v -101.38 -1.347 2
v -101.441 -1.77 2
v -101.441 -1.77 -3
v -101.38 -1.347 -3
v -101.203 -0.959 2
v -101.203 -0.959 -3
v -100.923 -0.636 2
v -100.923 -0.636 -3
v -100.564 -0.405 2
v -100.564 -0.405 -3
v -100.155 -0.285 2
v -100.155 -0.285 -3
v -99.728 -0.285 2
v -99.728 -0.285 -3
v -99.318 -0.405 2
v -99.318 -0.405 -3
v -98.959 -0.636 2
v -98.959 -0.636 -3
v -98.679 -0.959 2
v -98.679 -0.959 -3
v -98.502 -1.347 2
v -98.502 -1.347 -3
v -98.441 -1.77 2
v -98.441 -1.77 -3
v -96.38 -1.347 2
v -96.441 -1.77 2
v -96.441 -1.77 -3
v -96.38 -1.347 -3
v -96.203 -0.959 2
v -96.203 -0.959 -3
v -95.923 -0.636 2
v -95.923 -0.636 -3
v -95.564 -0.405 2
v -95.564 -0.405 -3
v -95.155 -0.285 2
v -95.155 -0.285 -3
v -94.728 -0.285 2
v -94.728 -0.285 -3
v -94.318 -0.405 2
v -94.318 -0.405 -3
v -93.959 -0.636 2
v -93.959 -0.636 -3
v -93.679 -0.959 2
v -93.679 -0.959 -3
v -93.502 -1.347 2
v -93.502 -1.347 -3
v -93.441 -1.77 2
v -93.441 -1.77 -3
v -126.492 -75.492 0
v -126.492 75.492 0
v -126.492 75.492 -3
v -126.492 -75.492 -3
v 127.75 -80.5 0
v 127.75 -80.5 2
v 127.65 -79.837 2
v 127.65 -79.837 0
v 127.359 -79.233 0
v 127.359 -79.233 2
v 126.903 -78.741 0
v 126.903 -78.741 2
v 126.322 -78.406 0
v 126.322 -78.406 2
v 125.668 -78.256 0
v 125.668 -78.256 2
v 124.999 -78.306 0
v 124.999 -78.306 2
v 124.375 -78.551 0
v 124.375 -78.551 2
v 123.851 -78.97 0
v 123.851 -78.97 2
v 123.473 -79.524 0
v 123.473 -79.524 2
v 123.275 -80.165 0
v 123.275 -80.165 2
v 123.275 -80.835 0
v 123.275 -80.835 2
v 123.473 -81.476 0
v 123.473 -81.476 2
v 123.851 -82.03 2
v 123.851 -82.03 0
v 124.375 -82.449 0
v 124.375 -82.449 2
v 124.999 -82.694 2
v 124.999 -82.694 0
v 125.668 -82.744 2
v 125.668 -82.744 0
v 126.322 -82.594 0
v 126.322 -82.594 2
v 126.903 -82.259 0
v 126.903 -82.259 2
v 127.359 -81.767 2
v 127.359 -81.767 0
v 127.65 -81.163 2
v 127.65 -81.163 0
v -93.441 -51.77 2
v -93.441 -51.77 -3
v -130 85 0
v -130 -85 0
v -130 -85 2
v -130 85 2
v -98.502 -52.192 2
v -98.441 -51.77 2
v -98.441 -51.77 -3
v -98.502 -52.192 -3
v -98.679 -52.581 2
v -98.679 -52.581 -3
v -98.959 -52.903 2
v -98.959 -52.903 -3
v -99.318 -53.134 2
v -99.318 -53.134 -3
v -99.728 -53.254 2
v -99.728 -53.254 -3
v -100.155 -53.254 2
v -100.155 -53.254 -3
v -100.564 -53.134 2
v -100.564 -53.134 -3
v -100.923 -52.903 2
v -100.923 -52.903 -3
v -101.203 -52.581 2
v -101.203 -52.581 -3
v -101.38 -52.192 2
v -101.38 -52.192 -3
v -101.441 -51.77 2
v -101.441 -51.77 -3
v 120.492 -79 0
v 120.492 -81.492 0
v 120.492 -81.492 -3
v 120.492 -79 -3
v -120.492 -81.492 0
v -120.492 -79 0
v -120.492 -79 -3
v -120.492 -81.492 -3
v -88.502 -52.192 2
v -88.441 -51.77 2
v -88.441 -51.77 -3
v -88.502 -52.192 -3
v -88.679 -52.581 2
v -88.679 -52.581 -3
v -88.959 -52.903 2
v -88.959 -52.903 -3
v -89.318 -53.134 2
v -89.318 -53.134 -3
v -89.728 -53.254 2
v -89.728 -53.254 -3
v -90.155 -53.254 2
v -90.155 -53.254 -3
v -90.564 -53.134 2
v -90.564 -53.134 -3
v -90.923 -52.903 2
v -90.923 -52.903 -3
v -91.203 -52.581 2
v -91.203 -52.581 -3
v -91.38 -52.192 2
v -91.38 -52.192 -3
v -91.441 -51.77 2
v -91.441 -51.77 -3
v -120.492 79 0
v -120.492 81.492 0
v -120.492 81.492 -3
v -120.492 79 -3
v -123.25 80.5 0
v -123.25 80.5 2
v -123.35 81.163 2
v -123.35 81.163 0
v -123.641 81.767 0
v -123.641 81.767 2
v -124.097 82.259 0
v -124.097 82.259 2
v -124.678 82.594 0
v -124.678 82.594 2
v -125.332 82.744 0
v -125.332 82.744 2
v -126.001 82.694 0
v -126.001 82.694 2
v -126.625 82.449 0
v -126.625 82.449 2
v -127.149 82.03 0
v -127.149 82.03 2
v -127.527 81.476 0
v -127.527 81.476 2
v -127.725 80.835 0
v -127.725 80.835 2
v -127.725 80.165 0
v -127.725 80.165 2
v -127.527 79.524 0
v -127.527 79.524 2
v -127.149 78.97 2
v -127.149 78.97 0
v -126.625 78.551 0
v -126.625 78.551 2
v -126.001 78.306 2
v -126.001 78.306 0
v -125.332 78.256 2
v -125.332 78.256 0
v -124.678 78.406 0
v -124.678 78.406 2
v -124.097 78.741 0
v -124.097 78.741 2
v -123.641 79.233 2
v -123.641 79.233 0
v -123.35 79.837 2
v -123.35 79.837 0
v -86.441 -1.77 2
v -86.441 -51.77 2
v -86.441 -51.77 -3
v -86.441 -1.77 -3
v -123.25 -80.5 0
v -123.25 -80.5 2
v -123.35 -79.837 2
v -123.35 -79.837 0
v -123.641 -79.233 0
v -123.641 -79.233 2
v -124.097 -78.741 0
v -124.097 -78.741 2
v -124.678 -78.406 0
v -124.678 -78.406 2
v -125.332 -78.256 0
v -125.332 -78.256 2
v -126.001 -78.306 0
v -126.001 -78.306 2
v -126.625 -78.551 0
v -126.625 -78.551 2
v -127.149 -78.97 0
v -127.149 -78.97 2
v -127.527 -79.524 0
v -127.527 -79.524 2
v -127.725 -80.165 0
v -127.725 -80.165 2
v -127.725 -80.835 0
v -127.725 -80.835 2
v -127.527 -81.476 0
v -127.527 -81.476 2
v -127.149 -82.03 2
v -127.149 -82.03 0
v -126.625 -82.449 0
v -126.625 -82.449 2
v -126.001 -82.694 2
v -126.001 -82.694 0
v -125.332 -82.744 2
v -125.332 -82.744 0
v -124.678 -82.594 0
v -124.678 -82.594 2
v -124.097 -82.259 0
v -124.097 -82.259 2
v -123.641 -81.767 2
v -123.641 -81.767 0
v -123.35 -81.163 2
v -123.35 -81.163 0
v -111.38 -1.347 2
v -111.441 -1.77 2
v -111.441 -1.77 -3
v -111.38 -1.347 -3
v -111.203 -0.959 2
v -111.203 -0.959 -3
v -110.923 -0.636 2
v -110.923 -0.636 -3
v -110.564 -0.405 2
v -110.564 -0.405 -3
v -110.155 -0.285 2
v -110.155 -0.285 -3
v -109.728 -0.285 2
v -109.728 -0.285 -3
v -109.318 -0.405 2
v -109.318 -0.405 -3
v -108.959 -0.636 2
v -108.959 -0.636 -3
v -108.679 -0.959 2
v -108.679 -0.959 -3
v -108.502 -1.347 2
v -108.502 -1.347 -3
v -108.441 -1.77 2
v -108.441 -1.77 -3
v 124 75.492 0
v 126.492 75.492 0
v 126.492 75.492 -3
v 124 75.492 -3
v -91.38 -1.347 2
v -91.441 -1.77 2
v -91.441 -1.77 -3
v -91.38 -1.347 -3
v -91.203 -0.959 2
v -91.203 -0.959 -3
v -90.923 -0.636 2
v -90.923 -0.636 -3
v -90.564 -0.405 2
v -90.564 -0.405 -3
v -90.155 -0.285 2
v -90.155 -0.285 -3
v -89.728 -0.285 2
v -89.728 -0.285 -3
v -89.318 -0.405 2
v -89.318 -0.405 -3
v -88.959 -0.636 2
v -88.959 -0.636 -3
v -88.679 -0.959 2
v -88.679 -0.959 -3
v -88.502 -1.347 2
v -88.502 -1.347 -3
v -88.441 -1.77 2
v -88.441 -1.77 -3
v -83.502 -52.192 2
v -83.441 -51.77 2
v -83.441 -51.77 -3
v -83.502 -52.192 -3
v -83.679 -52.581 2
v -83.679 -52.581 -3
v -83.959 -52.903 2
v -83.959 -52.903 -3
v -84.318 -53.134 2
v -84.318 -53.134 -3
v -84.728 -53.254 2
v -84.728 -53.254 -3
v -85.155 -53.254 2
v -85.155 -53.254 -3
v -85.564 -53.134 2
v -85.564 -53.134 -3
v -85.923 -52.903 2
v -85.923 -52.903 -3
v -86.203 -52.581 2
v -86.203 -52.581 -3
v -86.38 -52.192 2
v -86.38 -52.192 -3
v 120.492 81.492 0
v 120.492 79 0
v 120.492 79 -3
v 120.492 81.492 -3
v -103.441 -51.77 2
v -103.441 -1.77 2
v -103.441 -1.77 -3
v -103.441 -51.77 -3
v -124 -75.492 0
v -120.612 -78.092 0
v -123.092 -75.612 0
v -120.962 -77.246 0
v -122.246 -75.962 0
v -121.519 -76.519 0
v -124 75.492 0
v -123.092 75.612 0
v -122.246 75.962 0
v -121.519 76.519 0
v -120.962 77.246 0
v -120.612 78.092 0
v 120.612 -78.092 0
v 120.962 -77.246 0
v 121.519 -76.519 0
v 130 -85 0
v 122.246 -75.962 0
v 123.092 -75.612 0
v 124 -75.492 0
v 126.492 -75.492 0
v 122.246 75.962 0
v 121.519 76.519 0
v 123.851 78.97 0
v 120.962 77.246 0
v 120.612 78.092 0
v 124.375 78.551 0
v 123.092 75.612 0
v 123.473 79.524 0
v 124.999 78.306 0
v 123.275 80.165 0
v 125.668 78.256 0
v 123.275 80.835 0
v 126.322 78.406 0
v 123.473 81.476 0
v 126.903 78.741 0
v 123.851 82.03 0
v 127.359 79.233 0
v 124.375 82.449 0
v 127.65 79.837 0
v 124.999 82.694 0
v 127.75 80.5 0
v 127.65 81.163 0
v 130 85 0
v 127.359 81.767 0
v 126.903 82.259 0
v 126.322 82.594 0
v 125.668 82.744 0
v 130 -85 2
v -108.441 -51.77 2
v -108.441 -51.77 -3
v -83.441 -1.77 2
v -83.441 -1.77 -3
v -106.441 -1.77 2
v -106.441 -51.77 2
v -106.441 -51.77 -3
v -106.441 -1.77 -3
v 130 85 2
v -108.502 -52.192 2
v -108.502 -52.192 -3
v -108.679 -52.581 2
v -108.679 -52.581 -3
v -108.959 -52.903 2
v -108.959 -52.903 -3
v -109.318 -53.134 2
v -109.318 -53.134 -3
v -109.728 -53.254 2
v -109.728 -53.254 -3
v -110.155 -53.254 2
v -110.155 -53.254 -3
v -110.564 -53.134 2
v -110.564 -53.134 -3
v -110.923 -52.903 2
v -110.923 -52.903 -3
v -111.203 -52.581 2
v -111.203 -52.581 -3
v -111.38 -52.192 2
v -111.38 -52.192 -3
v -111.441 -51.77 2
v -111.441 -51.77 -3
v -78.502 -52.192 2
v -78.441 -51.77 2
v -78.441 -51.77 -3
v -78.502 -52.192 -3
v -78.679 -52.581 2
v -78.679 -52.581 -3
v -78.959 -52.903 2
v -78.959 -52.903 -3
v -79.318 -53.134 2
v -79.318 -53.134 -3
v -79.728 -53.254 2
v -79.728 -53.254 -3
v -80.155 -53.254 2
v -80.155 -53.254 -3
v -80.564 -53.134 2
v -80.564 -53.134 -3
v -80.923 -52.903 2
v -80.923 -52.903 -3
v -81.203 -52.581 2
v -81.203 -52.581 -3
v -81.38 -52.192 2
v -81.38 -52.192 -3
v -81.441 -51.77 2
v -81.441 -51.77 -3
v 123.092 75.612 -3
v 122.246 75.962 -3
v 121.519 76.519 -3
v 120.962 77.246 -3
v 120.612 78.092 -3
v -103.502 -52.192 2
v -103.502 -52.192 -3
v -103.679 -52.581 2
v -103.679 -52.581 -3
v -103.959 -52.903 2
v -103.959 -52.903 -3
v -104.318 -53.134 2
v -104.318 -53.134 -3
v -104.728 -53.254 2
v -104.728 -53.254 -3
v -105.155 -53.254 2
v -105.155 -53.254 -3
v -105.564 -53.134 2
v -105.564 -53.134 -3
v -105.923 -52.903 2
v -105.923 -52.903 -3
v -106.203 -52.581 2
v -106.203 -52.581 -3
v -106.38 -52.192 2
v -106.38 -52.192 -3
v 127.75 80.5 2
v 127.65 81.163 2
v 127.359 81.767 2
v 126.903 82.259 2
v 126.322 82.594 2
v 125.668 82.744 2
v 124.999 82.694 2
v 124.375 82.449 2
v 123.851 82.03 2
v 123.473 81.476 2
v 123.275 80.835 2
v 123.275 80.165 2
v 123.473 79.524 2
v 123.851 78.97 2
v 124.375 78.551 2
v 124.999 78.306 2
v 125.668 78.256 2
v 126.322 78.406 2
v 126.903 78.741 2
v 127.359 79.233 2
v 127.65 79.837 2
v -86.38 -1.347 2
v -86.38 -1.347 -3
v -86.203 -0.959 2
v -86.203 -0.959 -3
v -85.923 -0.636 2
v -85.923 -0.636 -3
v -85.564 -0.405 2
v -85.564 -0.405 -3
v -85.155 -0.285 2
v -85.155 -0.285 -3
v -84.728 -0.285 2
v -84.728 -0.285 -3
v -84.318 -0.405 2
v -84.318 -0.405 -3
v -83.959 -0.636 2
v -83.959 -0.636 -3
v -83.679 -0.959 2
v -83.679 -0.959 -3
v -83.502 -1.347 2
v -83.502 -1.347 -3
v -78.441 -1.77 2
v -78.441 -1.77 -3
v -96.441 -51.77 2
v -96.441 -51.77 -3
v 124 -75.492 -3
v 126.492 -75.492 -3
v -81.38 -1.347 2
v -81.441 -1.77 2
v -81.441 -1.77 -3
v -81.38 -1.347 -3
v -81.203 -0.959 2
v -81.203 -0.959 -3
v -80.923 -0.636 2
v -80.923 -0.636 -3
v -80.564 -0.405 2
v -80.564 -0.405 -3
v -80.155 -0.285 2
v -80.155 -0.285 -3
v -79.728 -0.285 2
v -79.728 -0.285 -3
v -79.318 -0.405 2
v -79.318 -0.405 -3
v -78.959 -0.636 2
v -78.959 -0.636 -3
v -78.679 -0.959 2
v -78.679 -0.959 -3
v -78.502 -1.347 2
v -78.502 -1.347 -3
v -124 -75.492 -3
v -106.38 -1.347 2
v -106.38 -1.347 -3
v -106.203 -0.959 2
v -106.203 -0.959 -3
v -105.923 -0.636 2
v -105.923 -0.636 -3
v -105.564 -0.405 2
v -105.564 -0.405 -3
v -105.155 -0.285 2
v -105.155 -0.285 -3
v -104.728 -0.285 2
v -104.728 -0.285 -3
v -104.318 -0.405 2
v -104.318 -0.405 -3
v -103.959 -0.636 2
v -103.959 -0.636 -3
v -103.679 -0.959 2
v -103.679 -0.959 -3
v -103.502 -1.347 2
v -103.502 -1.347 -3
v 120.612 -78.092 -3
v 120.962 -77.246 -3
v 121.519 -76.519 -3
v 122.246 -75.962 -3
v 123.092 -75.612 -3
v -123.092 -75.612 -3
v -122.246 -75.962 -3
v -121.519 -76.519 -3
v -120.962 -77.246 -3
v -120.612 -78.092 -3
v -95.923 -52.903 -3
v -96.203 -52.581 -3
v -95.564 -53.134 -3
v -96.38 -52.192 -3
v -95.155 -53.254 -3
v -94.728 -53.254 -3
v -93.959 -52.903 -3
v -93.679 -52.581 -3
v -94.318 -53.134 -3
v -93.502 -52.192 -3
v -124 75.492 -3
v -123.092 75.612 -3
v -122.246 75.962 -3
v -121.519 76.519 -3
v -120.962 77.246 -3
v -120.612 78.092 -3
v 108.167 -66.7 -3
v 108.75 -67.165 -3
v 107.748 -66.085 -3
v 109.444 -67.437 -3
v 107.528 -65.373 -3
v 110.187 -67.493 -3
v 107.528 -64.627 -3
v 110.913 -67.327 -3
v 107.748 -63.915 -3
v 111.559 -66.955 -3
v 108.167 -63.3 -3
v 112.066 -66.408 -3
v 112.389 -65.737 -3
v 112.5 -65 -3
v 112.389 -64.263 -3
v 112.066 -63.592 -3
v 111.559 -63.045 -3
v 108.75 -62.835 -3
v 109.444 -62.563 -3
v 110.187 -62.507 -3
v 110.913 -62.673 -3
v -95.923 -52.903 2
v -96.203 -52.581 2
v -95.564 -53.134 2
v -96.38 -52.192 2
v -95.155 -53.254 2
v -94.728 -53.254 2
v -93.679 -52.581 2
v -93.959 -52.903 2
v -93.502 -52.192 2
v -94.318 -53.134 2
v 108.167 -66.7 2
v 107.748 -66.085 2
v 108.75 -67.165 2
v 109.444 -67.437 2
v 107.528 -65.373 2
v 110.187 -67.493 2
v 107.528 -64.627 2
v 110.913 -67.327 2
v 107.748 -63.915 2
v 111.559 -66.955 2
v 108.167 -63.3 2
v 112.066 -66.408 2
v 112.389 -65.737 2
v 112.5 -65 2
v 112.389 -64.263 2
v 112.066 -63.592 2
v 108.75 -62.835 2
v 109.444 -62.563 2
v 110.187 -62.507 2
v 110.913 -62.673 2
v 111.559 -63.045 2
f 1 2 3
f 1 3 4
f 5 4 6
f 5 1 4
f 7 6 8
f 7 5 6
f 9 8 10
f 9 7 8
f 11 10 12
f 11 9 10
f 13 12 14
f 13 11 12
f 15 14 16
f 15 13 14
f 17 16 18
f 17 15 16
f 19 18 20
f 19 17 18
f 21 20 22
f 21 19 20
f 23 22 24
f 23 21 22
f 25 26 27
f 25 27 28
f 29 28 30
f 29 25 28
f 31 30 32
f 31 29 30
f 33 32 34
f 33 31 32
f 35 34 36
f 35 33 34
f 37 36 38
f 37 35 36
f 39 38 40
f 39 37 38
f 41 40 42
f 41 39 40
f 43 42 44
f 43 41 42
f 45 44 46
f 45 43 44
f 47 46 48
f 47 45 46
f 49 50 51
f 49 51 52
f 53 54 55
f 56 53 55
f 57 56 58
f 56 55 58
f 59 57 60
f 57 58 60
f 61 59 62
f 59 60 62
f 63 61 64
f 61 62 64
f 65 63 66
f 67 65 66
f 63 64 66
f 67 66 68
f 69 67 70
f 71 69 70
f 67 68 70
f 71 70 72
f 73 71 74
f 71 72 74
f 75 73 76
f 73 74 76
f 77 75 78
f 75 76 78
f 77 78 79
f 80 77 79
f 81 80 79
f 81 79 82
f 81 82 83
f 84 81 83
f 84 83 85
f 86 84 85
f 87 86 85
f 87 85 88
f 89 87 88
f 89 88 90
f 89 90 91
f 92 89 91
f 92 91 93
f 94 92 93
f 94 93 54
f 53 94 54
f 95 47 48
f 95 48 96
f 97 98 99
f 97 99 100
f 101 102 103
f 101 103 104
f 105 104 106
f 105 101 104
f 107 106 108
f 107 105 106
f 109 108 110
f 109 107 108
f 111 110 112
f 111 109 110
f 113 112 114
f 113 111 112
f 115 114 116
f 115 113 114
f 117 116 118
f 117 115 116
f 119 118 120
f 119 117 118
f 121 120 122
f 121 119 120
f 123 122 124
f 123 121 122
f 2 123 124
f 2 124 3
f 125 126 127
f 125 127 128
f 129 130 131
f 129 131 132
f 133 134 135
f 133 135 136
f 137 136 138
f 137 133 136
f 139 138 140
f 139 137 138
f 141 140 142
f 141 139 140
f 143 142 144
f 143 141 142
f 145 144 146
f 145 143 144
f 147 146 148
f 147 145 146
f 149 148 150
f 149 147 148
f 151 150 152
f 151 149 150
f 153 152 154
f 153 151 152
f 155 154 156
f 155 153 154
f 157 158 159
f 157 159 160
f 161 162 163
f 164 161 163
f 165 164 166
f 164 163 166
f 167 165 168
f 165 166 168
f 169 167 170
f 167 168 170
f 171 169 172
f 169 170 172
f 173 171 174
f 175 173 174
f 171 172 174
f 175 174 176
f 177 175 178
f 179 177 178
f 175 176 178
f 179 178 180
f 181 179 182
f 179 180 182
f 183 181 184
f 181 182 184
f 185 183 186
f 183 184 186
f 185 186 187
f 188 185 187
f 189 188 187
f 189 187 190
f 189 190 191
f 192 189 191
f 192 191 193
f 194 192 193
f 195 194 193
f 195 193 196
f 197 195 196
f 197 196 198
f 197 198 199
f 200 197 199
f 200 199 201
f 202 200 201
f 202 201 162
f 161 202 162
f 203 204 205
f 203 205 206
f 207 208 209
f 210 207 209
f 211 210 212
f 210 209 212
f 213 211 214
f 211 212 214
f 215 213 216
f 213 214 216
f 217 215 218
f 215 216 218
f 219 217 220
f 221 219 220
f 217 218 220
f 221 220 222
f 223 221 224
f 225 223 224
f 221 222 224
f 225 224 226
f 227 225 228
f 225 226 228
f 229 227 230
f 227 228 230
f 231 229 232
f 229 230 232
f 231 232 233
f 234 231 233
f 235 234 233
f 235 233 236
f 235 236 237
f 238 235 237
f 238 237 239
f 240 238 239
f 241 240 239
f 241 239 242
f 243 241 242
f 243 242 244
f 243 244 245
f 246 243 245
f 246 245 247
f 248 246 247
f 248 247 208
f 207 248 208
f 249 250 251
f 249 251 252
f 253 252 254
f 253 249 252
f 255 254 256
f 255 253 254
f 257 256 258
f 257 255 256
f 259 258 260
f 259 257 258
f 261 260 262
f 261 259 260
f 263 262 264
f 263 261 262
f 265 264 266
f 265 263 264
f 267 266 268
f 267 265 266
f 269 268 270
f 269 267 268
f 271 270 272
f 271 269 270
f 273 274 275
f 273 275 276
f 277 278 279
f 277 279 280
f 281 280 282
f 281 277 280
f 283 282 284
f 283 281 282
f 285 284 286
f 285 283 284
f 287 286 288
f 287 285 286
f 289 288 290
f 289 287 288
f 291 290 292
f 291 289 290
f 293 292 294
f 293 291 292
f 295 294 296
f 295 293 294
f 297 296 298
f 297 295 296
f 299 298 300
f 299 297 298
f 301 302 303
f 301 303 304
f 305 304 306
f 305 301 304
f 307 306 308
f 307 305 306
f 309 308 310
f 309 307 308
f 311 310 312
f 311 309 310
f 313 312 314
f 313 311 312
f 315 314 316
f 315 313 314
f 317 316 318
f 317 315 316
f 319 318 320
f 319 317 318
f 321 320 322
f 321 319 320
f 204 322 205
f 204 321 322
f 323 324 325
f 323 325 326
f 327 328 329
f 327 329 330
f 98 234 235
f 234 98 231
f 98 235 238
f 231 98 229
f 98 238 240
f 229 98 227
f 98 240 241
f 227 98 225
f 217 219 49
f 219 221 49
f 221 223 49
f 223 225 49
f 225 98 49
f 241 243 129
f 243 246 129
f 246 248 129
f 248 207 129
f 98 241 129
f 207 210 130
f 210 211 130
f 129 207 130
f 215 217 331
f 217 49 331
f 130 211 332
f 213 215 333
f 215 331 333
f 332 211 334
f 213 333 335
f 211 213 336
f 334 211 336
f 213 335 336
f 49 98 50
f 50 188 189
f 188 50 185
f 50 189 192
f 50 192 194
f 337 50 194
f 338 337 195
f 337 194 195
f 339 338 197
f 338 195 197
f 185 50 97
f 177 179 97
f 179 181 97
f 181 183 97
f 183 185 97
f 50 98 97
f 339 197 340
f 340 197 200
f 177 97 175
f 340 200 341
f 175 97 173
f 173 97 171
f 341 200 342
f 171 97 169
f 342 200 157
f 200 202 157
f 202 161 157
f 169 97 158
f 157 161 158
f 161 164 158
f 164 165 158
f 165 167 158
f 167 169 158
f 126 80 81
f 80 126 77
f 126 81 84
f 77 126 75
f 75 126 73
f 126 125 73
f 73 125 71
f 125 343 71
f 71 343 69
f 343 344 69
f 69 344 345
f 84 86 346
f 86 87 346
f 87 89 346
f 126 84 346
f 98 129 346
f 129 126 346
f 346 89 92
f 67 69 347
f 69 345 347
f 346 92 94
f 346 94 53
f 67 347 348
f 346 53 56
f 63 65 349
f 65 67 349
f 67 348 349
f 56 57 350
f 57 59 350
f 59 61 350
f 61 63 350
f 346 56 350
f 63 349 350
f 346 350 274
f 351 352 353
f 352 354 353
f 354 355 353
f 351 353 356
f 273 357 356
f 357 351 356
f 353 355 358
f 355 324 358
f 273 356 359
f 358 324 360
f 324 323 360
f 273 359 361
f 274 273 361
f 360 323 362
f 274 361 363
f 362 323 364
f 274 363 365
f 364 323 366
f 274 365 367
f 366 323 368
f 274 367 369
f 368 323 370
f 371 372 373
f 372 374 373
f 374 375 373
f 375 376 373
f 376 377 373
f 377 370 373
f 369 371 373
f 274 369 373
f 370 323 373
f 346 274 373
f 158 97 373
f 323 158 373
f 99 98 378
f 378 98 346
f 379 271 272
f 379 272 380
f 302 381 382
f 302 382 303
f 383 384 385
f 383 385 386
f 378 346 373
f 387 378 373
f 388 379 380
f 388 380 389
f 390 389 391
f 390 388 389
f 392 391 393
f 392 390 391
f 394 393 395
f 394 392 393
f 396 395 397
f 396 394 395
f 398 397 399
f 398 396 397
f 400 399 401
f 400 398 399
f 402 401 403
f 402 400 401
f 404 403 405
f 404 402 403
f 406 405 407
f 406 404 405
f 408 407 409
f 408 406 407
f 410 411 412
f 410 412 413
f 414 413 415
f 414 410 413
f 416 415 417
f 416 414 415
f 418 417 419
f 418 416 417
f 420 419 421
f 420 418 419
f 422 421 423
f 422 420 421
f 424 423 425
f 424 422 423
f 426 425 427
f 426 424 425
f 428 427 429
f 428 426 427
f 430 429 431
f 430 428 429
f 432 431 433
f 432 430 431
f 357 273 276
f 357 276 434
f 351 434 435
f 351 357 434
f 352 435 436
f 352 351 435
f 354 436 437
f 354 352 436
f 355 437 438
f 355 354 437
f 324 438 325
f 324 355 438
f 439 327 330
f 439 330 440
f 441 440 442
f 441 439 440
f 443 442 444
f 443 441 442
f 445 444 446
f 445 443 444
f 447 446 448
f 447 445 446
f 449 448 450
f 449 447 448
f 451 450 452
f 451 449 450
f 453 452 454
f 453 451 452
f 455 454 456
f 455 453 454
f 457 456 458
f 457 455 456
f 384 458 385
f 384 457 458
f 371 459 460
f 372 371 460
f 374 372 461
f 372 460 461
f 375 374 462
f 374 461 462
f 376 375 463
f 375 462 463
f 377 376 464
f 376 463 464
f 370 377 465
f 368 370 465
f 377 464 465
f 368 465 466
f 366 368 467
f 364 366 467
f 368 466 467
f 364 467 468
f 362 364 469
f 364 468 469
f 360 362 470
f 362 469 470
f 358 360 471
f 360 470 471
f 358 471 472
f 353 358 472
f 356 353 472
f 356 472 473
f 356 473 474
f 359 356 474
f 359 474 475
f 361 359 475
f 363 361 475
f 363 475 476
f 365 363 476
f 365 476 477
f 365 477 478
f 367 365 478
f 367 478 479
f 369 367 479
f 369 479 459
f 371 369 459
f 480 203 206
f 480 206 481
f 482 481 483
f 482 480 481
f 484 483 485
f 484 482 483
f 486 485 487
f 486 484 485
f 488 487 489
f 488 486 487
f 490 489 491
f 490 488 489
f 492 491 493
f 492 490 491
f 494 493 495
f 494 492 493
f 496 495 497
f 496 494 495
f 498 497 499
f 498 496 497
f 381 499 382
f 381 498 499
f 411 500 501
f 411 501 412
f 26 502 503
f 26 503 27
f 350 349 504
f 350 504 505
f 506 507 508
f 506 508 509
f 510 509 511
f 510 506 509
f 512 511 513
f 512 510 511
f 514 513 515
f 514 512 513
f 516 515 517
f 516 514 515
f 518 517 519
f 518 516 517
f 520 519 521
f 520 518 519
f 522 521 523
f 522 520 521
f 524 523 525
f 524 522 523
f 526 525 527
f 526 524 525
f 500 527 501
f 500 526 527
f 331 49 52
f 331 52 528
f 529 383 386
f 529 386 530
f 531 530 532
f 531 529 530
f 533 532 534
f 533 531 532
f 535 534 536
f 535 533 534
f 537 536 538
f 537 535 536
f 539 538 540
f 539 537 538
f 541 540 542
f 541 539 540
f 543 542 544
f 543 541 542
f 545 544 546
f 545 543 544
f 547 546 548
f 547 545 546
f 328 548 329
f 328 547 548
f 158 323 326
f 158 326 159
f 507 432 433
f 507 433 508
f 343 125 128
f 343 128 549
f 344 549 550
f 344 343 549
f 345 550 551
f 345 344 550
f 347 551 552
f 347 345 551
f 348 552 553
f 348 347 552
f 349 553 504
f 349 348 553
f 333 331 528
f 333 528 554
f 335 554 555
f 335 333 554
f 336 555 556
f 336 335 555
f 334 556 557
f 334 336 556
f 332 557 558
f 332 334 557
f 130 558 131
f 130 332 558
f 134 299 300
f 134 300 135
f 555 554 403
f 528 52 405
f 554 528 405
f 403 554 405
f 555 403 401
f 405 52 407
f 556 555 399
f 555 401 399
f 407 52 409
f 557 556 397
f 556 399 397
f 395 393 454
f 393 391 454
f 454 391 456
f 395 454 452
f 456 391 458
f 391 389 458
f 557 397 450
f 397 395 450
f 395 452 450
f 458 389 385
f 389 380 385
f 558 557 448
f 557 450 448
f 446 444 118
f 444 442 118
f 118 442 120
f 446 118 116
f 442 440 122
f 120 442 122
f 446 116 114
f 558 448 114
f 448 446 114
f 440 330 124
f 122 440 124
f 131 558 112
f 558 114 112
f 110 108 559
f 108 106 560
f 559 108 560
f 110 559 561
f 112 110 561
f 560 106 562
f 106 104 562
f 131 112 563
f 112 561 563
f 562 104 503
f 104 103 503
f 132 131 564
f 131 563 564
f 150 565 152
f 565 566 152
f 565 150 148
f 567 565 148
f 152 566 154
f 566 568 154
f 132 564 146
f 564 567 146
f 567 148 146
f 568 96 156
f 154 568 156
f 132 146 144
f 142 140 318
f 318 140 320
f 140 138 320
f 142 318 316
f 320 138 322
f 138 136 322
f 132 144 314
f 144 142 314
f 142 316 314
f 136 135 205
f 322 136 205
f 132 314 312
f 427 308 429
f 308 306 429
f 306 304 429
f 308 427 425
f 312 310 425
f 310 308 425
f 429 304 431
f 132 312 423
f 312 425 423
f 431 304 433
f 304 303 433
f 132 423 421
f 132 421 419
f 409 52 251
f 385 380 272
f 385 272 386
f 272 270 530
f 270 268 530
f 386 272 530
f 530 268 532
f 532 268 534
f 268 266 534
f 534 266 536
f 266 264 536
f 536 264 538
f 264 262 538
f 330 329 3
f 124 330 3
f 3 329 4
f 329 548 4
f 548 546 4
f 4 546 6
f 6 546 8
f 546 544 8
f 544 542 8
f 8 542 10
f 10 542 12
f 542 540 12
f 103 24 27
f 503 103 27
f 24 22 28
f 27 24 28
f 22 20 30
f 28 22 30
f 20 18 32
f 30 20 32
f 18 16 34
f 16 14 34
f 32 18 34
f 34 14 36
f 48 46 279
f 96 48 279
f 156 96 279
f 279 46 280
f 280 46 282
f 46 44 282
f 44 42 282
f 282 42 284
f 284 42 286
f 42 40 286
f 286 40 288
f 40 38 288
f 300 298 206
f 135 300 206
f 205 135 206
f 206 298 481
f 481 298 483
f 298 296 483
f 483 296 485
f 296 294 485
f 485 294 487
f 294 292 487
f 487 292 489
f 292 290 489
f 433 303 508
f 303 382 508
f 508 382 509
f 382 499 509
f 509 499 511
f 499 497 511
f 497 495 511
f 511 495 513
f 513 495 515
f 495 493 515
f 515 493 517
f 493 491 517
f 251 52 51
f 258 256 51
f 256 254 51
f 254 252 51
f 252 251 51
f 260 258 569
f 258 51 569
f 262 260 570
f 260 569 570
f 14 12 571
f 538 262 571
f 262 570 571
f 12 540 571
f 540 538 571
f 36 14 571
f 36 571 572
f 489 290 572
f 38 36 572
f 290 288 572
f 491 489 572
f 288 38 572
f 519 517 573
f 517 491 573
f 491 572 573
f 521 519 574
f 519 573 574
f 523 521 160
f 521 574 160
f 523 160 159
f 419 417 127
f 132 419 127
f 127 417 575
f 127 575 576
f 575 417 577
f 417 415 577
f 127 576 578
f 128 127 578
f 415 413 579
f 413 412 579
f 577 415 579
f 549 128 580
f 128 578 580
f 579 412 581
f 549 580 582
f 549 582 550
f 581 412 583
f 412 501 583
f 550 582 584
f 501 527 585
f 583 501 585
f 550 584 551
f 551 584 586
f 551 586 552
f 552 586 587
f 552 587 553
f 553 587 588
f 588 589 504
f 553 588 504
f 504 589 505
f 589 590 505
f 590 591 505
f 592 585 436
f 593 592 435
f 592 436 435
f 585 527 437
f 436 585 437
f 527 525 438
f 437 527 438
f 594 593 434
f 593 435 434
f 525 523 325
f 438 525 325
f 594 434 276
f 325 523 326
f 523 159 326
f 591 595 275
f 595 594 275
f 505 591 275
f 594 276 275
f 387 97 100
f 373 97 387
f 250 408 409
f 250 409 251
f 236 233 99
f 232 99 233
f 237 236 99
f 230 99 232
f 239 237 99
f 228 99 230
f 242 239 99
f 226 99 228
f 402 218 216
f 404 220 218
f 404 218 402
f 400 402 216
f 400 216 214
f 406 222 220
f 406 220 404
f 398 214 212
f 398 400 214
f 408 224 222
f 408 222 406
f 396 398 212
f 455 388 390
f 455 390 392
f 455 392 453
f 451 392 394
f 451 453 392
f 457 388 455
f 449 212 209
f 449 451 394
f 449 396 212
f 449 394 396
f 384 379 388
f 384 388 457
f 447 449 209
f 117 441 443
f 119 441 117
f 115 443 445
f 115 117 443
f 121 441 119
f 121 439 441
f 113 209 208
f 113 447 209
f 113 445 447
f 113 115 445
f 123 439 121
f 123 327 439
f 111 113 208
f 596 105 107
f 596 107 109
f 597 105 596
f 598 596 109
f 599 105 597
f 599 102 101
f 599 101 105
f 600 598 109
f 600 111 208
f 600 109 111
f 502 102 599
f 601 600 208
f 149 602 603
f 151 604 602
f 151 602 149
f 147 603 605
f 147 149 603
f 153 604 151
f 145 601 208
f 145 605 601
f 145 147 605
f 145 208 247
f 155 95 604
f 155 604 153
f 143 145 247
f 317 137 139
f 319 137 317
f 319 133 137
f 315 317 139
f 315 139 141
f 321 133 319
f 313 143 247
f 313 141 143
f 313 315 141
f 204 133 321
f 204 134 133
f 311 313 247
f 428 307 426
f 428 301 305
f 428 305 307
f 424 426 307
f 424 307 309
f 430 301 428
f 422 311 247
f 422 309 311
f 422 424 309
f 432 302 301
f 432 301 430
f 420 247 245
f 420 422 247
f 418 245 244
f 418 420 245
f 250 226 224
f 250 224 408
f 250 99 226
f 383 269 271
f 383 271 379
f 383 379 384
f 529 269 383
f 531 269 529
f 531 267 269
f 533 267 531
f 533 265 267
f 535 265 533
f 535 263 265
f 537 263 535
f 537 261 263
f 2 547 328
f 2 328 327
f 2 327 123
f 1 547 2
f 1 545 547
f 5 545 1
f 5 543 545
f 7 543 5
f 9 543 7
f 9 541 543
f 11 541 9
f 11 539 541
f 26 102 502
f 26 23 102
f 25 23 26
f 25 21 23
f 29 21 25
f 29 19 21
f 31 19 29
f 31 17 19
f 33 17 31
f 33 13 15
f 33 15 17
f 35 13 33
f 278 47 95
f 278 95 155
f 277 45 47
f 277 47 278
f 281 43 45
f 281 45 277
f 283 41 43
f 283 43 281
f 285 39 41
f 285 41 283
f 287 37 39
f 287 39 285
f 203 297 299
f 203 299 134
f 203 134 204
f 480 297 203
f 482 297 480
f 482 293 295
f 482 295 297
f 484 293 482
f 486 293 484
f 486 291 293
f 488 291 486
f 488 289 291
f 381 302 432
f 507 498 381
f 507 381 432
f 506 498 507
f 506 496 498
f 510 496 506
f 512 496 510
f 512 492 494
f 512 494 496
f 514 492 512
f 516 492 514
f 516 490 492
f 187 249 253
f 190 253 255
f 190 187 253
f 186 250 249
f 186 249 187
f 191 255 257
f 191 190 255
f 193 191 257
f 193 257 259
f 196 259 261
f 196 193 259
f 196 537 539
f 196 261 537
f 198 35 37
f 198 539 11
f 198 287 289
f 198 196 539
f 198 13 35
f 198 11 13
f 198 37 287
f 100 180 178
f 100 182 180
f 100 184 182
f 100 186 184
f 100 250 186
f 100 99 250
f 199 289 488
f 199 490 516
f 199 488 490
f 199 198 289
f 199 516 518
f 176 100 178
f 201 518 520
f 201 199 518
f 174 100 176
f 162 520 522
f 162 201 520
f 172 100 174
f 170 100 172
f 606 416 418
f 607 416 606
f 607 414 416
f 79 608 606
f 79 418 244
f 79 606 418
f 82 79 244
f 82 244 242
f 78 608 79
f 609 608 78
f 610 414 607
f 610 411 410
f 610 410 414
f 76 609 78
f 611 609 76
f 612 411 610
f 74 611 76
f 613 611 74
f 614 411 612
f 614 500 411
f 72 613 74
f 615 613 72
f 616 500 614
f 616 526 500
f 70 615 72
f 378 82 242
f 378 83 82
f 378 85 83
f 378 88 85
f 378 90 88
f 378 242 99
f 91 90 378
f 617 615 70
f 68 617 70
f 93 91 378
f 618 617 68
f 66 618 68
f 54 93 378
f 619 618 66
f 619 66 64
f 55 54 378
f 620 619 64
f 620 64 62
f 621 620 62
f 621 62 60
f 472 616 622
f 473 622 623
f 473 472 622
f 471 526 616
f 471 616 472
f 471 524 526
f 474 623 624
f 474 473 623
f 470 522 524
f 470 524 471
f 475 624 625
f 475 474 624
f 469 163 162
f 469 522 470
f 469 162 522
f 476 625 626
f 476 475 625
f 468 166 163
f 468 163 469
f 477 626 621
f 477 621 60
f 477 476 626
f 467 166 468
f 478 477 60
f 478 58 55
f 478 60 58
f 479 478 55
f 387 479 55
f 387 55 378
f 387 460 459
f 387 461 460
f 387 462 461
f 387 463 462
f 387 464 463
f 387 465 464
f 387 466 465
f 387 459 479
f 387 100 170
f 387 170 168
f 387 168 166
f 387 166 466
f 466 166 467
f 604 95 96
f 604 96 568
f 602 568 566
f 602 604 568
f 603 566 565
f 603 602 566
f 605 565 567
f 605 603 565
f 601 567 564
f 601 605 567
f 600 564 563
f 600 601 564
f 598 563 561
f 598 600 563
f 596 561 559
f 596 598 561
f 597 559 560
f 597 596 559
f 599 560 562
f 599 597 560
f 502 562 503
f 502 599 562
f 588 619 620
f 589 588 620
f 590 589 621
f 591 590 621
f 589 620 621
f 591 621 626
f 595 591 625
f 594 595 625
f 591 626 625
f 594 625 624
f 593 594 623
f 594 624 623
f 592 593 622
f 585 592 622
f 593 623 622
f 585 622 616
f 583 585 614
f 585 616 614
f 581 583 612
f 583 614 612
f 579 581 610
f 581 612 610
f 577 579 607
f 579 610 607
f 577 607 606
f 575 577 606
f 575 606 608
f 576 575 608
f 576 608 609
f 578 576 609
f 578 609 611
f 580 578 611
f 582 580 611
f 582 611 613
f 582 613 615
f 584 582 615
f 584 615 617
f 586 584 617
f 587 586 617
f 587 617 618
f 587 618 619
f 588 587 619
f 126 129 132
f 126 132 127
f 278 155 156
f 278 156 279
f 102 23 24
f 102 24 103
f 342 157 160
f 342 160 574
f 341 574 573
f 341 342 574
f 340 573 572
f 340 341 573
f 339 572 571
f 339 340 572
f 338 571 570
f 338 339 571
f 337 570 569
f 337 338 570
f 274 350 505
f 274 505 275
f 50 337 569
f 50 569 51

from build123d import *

# Parameters (mm, degrees)
SKETCH1_W           = 260
SKETCH1_H           = 170
BOSS_EXTRUDE1_DEPTH = 2
BOSS_EXTRUDE2_DEPTH = 3
CUT_EXTRUDE1_DEPTH  = 156.402702679
SKETCH4_R           = 2.5
CUT_EXTRUDE2_DEPTH  = 156.402702679
CUT_EXTRUDE3_REACH  = 157.403
SKETCH6_R           = 2.25


with BuildPart() as part:
    # Sketch1 → Boss-Extrude1 (new body)
    with BuildSketch(Plane.XY):
        Rectangle(SKETCH1_W, SKETCH1_H)
    extrude(amount=BOSS_EXTRUDE1_DEPTH)

    # Sketch2 → Boss-Extrude2 (add)
    with BuildSketch(Plane(origin=(0, 0, 0), x_dir=(-1, 0, 0), z_dir=(0, 0, -1))):
        with BuildLine():
            Line((-120.492, 81.492), (120.492, 81.492))
            Line((120.492, 81.492), (120.492, 79))
            ThreePointArc((120.492, 79), (121.519469412, 76.519469412), (124, 75.492))
            Line((124, 75.492), (126.492, 75.492))
            Line((126.492, 75.492), (126.492, -75.492))
            Line((126.492, -75.492), (124, -75.492))
            ThreePointArc((124, -75.492), (121.519469412, -76.519469412), (120.492, -79))
            Line((120.492, -79), (120.492, -81.492))
            Line((120.492, -81.492), (-120.492, -81.492))
            Line((-120.492, -81.492), (-120.492, -79))
            ThreePointArc((-120.492, -79), (-121.519469412, -76.519469412), (-124, -75.492))
            Line((-124, -75.492), (-126.492, -75.492))
            Line((-126.492, -75.492), (-126.492, 75.492))
            Line((-126.492, 75.492), (-124, 75.492))
            ThreePointArc((-124, 75.492), (-121.519469412, 76.519469412), (-120.492, 79))
            Line((-120.492, 79), (-120.492, 81.492))
        make_face()
    extrude(amount=BOSS_EXTRUDE2_DEPTH)

    # Sketch3 → Cut-Extrude1 (cut, through all)
    with BuildSketch(Plane.XY.offset(2)):
        with BuildLine():
            Line((-108.441183291, -1.769742849), (-108.441183291, -51.769742849))
            ThreePointArc((-108.441183291, -51.769742849), (-109.941183291, -53.269742849), (-111.441183291, -51.769742849))
            Line((-111.441183291, -51.769742849), (-111.441183291, -1.769742849))
            ThreePointArc((-111.441183291, -1.769742849), (-109.941183291, -0.269742849), (-108.441183291, -1.769742849))
        make_face()
        with BuildLine():
            Line((-103.441183291, -1.769742849), (-103.441183291, -51.769742849))
            ThreePointArc((-103.441183291, -51.769742849), (-104.941183291, -53.269742849), (-106.441183291, -51.769742849))
            Line((-106.441183291, -51.769742849), (-106.441183291, -1.769742849))
            ThreePointArc((-106.441183291, -1.769742849), (-104.941183291, -0.269742849), (-103.441183291, -1.769742849))
        make_face()
        with BuildLine():
            Line((-98.441183291, -1.769742849), (-98.441183291, -51.769742849))
            ThreePointArc((-98.441183291, -51.769742849), (-99.941183291, -53.269742849), (-101.441183291, -51.769742849))
            Line((-101.441183291, -51.769742849), (-101.441183291, -1.769742849))
            ThreePointArc((-101.441183291, -1.769742849), (-99.941183291, -0.269742849), (-98.441183291, -1.769742849))
        make_face()
        with BuildLine():
            Line((-93.441183291, -1.769742849), (-93.441183291, -51.769742849))
            ThreePointArc((-93.441183291, -51.769742849), (-94.941183291, -53.269742849), (-96.441183291, -51.769742849))
            Line((-96.441183291, -51.769742849), (-96.441183291, -1.769742849))
            ThreePointArc((-96.441183291, -1.769742849), (-94.941183291, -0.269742849), (-93.441183291, -1.769742849))
        make_face()
        with BuildLine():
            Line((-88.441183291, -1.769742849), (-88.441183291, -51.769742849))
            ThreePointArc((-88.441183291, -51.769742849), (-89.941183291, -53.269742849), (-91.441183291, -51.769742849))
            Line((-91.441183291, -51.769742849), (-91.441183291, -1.769742849))
            ThreePointArc((-91.441183291, -1.769742849), (-89.941183291, -0.269742849), (-88.441183291, -1.769742849))
        make_face()
        with BuildLine():
            Line((-83.441183291, -1.769742849), (-83.441183291, -51.769742849))
            ThreePointArc((-83.441183291, -51.769742849), (-84.941183291, -53.269742849), (-86.441183291, -51.769742849))
            Line((-86.441183291, -51.769742849), (-86.441183291, -1.769742849))
            ThreePointArc((-86.441183291, -1.769742849), (-84.941183291, -0.269742849), (-83.441183291, -1.769742849))
        make_face()
        with BuildLine():
            Line((-78.441183291, -1.769742849), (-78.441183291, -51.769742849))
            ThreePointArc((-78.441183291, -51.769742849), (-79.941183291, -53.269742849), (-81.441183291, -51.769742849))
            Line((-81.441183291, -51.769742849), (-81.441183291, -1.769742849))
            ThreePointArc((-81.441183291, -1.769742849), (-79.941183291, -0.269742849), (-78.441183291, -1.769742849))
        make_face()
    extrude(amount=-CUT_EXTRUDE1_DEPTH, mode=Mode.SUBTRACT)

    # Sketch4 → Cut-Extrude2 (cut, through all)
    with BuildSketch(Plane.XY.offset(2)):
        with Locations((110, -65)):
            Circle(SKETCH4_R)
    extrude(amount=-CUT_EXTRUDE2_DEPTH, mode=Mode.SUBTRACT)

    # Sketch6 → Cut-Extrude3 (cut, up to next)
    with BuildSketch(Plane.XY.offset(2), mode=Mode.PRIVATE) as cut_extrude3_sk1:
        with Locations((-125.5, -80.5)):
            Circle(SKETCH6_R)
    cut_extrude3_tool1 = extrude(cut_extrude3_sk1.sketch, amount=-CUT_EXTRUDE3_REACH, mode=Mode.PRIVATE) & part.part
    # Sketch6 → Cut-Extrude3 (cut, up to next)
    with BuildSketch(Plane.XY.offset(2), mode=Mode.PRIVATE) as cut_extrude3_sk2:
        with Locations((-125.5, 80.5)):
            Circle(SKETCH6_R)
    cut_extrude3_tool2 = extrude(cut_extrude3_sk2.sketch, amount=-CUT_EXTRUDE3_REACH, mode=Mode.PRIVATE) & part.part
    # Sketch6 → Cut-Extrude3 (cut, up to next)
    with BuildSketch(Plane.XY.offset(2), mode=Mode.PRIVATE) as cut_extrude3_sk3:
        with Locations((125.5, 80.5)):
            Circle(SKETCH6_R)
    cut_extrude3_tool3 = extrude(cut_extrude3_sk3.sketch, amount=-CUT_EXTRUDE3_REACH, mode=Mode.PRIVATE) & part.part
    # Sketch6 → Cut-Extrude3 (cut, up to next)
    with BuildSketch(Plane.XY.offset(2), mode=Mode.PRIVATE) as cut_extrude3_sk4:
        with Locations((125.5, -80.5)):
            Circle(SKETCH6_R)
    cut_extrude3_tool4 = extrude(cut_extrude3_sk4.sketch, amount=-CUT_EXTRUDE3_REACH, mode=Mode.PRIVATE) & part.part
    add(cut_extrude3_tool1.solids().sort_by_distance((-125.5, -80.5, 2))[0], mode=Mode.SUBTRACT)
    add(cut_extrude3_tool2.solids().sort_by_distance((-125.5, 80.5, 2))[0], mode=Mode.SUBTRACT)
    add(cut_extrude3_tool3.solids().sort_by_distance((125.5, 80.5, 2))[0], mode=Mode.SUBTRACT)
    add(cut_extrude3_tool4.solids().sort_by_distance((125.5, -80.5, 2))[0], mode=Mode.SUBTRACT)


solid = part.part
